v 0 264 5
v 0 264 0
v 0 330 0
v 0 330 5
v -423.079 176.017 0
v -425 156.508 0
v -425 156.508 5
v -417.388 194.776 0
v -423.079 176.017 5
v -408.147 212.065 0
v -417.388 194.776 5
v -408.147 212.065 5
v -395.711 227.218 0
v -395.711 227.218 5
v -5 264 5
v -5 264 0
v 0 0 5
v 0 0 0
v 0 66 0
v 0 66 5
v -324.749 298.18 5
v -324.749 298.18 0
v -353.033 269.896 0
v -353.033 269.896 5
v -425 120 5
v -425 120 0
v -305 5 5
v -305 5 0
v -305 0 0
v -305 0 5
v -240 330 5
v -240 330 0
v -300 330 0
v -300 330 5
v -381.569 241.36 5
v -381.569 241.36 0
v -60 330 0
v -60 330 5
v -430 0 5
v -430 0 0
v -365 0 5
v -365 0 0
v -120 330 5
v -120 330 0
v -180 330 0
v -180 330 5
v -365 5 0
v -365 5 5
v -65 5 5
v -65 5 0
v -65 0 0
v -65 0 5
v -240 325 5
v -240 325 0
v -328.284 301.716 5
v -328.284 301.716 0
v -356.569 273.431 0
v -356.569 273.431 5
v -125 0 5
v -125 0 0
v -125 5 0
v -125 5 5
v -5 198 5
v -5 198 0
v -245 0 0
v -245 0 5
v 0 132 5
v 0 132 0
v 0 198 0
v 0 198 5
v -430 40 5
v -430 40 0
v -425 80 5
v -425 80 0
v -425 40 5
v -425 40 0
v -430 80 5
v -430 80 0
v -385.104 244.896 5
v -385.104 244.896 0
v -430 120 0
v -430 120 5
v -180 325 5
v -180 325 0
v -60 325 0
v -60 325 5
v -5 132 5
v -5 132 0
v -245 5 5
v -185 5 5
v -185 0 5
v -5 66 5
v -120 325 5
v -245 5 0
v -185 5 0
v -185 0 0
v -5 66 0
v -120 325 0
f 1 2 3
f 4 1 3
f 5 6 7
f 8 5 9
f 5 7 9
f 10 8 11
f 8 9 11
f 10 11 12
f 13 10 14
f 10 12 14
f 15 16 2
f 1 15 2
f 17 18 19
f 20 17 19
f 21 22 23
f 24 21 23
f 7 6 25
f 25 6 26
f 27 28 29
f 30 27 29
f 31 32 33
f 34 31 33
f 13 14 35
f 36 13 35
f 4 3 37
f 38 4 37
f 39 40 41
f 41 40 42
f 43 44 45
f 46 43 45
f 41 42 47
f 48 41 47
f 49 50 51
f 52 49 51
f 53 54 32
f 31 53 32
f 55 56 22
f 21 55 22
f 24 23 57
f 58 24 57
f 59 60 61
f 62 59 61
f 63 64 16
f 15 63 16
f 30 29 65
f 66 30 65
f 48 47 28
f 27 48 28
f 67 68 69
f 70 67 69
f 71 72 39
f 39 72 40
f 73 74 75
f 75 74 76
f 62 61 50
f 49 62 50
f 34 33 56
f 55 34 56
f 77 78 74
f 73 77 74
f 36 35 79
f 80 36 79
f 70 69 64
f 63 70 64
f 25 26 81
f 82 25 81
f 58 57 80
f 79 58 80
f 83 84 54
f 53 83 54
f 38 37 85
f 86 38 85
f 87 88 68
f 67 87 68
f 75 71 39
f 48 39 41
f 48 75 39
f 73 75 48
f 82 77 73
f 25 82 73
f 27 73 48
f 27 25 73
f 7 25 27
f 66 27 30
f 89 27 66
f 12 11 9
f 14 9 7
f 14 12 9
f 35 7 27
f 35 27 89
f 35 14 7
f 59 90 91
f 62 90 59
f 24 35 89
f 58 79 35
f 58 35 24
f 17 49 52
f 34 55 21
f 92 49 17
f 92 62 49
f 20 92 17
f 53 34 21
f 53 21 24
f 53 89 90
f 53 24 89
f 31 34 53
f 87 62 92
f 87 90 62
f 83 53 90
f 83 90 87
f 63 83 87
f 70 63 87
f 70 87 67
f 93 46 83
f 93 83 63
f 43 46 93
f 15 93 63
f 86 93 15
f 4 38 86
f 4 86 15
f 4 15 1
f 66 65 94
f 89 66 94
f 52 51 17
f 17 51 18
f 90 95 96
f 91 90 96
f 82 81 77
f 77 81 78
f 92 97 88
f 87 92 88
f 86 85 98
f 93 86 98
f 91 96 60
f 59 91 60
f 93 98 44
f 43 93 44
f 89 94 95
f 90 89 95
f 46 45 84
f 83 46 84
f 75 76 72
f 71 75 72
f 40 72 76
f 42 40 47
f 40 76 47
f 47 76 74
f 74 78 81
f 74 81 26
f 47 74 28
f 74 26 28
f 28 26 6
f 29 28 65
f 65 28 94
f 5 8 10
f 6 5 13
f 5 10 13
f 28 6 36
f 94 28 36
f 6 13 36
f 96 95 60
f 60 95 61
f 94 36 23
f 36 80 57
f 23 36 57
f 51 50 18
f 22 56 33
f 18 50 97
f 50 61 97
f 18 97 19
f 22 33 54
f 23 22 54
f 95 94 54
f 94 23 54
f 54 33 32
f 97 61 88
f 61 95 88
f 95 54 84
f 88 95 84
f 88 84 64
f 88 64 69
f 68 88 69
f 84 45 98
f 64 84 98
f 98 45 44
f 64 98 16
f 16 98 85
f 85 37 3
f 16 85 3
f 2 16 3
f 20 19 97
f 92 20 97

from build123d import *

# Parameters (mm, degrees)
BOSS_EXTRU_1_DEPTH      = 5
ENL_V_MAT_EXTRU_1_REACH = 7


with BuildPart() as part:
    # Esquisse1 → Boss.-Extru.1 (new body)
    with BuildSketch(Plane.XY):
        Polygon((0, 330), (-60, 330), (-60, 325), (-120, 325), (-120, 330), (-180, 330), (-180, 325), (-240, 325), (-240, 330), (-300, 330), (-328.284271247, 301.715728753), (-324.748737342, 298.180194847), (-353.033008589, 269.895923599), (-356.568542495, 273.431457505), (-399.901875828, 230.098124172), (-396.366341922, 226.562590266), (-411.415404008, 211.51352818), (-414.950937914, 215.049062086), (-430, 200), (-430, 160), (-425, 160), (-425, 120), (-430, 120), (-430, 80), (-425, 80), (-425, 40), (-430, 40), (-430, 0), (-365, 0), (-365, 5), (-305, 5), (-305, 0), (-245, 0), (-245, 5), (-185, 5), (-185, 0), (-125, 0), (-125, 5), (-65, 5), (-65, 0), (0, 0), (0, 66), (-5, 66), (-5, 132), (0, 132), (0, 198), (-5, 198), (-5, 264), (0, 264), align=None)
    extrude(amount=BOSS_EXTRU_1_DEPTH)

    # Esquisse2 → Enlèv. mat.-Extru.1 (cut, up to next)
    with BuildSketch(Plane.XY.offset(5), mode=Mode.PRIVATE) as enl_v_mat_extru_1_sk1:
        with BuildLine():
            Line((-395.710678119, 227.218254069), (-381.568542495, 241.360389693))
            Line((-381.568542495, 241.360389693), (-385.104076401, 244.895923599))
            Line((-385.104076401, 244.895923599), (-430, 200))
            Line((-430, 200), (-430, 156.507575951))
            Line((-430, 156.507575951), (-425, 156.507575951))
            ThreePointArc((-425, 156.507575951), (-417.387953251, 194.775919187), (-395.710678119, 227.218254069))
        make_face()
    enl_v_mat_extru_1_tool1 = extrude(enl_v_mat_extru_1_sk1.sketch, amount=-ENL_V_MAT_EXTRU_1_REACH, mode=Mode.PRIVATE) & part.part
    add(enl_v_mat_extru_1_tool1.solids().sort_by_distance((-415.711514, 201.173028, 5))[0], mode=Mode.SUBTRACT)


solid = part.part
